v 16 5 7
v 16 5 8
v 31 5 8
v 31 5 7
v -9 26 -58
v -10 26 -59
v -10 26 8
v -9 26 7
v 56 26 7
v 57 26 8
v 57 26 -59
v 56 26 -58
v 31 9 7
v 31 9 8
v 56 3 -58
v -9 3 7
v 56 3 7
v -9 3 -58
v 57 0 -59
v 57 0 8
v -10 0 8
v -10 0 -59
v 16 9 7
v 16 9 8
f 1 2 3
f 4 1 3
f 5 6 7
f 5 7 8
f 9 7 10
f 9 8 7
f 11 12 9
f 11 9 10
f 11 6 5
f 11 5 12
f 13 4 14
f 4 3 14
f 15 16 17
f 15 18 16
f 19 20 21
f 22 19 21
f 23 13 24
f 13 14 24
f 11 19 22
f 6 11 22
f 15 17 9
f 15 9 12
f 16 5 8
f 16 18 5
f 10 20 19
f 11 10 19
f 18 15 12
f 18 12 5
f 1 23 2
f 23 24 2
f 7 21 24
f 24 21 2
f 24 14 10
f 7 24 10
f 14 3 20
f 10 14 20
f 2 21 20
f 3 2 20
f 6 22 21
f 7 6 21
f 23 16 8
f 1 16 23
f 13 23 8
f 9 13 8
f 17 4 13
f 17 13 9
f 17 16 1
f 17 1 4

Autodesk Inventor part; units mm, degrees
ref_plane "YZ Plane" through (0, 0, 0) normal (1, 0, 0) x (0, 1, 0)
ref_plane "XZ Plane" through (0, 0, 0) normal (0, 1, 0) x (-1, 0, 0)
ref_plane "XY Plane" through (0, 0, 0) normal (0, 0, 1) x (1, 0, 0)
sketch "Boceto1" plane through (0, 0, 0) normal (0, 1, 0) x (-1, 0, 0)
  line L0 (9, 7) -> (-56, 7)
  line L1 (-56, 7) -> (-56, -58)
  line L2 (-56, -58) -> (9, -58)
  line L3 (9, -58) -> (9, 7)
  point P0 (0, 0)
  dimension "d0" = 65
  dimension "d1" = 65
extrude "Extrusión1" add sketch "Boceto1" along normal blind 3
sketch "Boceto2" plane through (0, 3, 0) normal (0, 1, 0) x (1, 0, 0)
  line L0 (-9, -7) -> (56, -7) projected
  line L1 (56, -7) -> (56, 58) projected
  line L2 (56, 58) -> (-9, 58) projected
  line L3 (-9, 58) -> (-9, -7) projected
  line L4 (-10, -8) -> (57, -8)
  line L5 (57, -8) -> (57, 59)
  line L6 (57, 59) -> (-10, 59)
  line L7 (-10, 59) -> (-10, -8)
  line L8 (-10, -8) -> (57, 59) construction
  line L9 (57, -8) -> (-10, 59) construction
  point P0 (0, 0)
  point P1 (23.5, 25.5)
  dimension "d4" = 67
  dimension "d5" = 67
extrude "Extrusión2" add sketch "Boceto2" against normal blind 3
sketch "Boceto3" plane through (0, 3, 0) normal (0, 1, 0) x (1, 0, 0)
  line L0 (-10, -8) -> (57, -8) projected
  line L1 (57, -8) -> (57, 59) projected
  line L2 (57, 59) -> (-10, 59) projected
  line L3 (-10, 59) -> (-10, -8) projected
  line L4 (-9, -7) -> (56, -7)
  line L5 (56, -7) -> (56, 58)
  line L6 (56, 58) -> (-9, 58)
  line L7 (-9, 58) -> (-9, -7)
  line L8 (-9, -7) -> (56, 58) construction
  line L9 (56, -7) -> (-9, 58) construction
  point P0 (0, 0)
  point P1 (23.5, 25.5)
  dimension "d8" = 65
  dimension "d9" = 65
extrude "Extrusión3" add sketch "Boceto3" along normal blind 23
sketch "Boceto4" plane through (-10, 0, 8) normal (0, 0, 1) x (1, 0, 0)
  line L0 (0, 26) -> (0, 0) projected
  line L1 (67, 0) -> (0, 0) projected
  line L2 (67, 0) -> (67, 26) projected
  line L3 (0, 26) -> (67, 26) projected
  line L4 (41, 9) -> (26, 9)
  line L5 (26, 9) -> (26, 5)
  line L6 (26, 5) -> (41, 5)
  line L7 (41, 5) -> (41, 9)
  line L8 (41, 9) -> (26, 5) construction
  line L9 (26, 9) -> (41, 5) construction
  point P0 (10, 0)
  point P1 (33.5, 7)
extrude "Extrusión4" cut sketch "Boceto4" against normal blind 50 contours L7 L6 L5 L4
sketch "Boceto6" plane through (0, 26, 0) normal (0, 1, 0) x (1, 0, 0)
  line L0 (57, 59) -> (-10, 59) projected
  line L1 (57, -8) -> (57, 59) projected
  line L2 (-10, -8) -> (57, -8) projected
  line L3 (-10, 59) -> (-10, -8) projected
  line L4 (-12.5, 61.5) -> (59.5, 61.5)
  line L5 (59.5, 61.5) -> (59.5, -10.5)
  line L6 (59.5, -10.5) -> (-12.5, -10.5)
  line L7 (-12.5, -10.5) -> (-12.5, 61.5)
  line L8 (-12.5, 61.5) -> (59.5, -10.5) construction
  line L9 (59.5, 61.5) -> (-12.5, -10.5) construction
  point P0 (0, 0)
  point P1 (23.5, 25.5)
  dimension "d14" = 72
  dimension "d15" = 72
properties part number "Cajapotenciometro_v1"
